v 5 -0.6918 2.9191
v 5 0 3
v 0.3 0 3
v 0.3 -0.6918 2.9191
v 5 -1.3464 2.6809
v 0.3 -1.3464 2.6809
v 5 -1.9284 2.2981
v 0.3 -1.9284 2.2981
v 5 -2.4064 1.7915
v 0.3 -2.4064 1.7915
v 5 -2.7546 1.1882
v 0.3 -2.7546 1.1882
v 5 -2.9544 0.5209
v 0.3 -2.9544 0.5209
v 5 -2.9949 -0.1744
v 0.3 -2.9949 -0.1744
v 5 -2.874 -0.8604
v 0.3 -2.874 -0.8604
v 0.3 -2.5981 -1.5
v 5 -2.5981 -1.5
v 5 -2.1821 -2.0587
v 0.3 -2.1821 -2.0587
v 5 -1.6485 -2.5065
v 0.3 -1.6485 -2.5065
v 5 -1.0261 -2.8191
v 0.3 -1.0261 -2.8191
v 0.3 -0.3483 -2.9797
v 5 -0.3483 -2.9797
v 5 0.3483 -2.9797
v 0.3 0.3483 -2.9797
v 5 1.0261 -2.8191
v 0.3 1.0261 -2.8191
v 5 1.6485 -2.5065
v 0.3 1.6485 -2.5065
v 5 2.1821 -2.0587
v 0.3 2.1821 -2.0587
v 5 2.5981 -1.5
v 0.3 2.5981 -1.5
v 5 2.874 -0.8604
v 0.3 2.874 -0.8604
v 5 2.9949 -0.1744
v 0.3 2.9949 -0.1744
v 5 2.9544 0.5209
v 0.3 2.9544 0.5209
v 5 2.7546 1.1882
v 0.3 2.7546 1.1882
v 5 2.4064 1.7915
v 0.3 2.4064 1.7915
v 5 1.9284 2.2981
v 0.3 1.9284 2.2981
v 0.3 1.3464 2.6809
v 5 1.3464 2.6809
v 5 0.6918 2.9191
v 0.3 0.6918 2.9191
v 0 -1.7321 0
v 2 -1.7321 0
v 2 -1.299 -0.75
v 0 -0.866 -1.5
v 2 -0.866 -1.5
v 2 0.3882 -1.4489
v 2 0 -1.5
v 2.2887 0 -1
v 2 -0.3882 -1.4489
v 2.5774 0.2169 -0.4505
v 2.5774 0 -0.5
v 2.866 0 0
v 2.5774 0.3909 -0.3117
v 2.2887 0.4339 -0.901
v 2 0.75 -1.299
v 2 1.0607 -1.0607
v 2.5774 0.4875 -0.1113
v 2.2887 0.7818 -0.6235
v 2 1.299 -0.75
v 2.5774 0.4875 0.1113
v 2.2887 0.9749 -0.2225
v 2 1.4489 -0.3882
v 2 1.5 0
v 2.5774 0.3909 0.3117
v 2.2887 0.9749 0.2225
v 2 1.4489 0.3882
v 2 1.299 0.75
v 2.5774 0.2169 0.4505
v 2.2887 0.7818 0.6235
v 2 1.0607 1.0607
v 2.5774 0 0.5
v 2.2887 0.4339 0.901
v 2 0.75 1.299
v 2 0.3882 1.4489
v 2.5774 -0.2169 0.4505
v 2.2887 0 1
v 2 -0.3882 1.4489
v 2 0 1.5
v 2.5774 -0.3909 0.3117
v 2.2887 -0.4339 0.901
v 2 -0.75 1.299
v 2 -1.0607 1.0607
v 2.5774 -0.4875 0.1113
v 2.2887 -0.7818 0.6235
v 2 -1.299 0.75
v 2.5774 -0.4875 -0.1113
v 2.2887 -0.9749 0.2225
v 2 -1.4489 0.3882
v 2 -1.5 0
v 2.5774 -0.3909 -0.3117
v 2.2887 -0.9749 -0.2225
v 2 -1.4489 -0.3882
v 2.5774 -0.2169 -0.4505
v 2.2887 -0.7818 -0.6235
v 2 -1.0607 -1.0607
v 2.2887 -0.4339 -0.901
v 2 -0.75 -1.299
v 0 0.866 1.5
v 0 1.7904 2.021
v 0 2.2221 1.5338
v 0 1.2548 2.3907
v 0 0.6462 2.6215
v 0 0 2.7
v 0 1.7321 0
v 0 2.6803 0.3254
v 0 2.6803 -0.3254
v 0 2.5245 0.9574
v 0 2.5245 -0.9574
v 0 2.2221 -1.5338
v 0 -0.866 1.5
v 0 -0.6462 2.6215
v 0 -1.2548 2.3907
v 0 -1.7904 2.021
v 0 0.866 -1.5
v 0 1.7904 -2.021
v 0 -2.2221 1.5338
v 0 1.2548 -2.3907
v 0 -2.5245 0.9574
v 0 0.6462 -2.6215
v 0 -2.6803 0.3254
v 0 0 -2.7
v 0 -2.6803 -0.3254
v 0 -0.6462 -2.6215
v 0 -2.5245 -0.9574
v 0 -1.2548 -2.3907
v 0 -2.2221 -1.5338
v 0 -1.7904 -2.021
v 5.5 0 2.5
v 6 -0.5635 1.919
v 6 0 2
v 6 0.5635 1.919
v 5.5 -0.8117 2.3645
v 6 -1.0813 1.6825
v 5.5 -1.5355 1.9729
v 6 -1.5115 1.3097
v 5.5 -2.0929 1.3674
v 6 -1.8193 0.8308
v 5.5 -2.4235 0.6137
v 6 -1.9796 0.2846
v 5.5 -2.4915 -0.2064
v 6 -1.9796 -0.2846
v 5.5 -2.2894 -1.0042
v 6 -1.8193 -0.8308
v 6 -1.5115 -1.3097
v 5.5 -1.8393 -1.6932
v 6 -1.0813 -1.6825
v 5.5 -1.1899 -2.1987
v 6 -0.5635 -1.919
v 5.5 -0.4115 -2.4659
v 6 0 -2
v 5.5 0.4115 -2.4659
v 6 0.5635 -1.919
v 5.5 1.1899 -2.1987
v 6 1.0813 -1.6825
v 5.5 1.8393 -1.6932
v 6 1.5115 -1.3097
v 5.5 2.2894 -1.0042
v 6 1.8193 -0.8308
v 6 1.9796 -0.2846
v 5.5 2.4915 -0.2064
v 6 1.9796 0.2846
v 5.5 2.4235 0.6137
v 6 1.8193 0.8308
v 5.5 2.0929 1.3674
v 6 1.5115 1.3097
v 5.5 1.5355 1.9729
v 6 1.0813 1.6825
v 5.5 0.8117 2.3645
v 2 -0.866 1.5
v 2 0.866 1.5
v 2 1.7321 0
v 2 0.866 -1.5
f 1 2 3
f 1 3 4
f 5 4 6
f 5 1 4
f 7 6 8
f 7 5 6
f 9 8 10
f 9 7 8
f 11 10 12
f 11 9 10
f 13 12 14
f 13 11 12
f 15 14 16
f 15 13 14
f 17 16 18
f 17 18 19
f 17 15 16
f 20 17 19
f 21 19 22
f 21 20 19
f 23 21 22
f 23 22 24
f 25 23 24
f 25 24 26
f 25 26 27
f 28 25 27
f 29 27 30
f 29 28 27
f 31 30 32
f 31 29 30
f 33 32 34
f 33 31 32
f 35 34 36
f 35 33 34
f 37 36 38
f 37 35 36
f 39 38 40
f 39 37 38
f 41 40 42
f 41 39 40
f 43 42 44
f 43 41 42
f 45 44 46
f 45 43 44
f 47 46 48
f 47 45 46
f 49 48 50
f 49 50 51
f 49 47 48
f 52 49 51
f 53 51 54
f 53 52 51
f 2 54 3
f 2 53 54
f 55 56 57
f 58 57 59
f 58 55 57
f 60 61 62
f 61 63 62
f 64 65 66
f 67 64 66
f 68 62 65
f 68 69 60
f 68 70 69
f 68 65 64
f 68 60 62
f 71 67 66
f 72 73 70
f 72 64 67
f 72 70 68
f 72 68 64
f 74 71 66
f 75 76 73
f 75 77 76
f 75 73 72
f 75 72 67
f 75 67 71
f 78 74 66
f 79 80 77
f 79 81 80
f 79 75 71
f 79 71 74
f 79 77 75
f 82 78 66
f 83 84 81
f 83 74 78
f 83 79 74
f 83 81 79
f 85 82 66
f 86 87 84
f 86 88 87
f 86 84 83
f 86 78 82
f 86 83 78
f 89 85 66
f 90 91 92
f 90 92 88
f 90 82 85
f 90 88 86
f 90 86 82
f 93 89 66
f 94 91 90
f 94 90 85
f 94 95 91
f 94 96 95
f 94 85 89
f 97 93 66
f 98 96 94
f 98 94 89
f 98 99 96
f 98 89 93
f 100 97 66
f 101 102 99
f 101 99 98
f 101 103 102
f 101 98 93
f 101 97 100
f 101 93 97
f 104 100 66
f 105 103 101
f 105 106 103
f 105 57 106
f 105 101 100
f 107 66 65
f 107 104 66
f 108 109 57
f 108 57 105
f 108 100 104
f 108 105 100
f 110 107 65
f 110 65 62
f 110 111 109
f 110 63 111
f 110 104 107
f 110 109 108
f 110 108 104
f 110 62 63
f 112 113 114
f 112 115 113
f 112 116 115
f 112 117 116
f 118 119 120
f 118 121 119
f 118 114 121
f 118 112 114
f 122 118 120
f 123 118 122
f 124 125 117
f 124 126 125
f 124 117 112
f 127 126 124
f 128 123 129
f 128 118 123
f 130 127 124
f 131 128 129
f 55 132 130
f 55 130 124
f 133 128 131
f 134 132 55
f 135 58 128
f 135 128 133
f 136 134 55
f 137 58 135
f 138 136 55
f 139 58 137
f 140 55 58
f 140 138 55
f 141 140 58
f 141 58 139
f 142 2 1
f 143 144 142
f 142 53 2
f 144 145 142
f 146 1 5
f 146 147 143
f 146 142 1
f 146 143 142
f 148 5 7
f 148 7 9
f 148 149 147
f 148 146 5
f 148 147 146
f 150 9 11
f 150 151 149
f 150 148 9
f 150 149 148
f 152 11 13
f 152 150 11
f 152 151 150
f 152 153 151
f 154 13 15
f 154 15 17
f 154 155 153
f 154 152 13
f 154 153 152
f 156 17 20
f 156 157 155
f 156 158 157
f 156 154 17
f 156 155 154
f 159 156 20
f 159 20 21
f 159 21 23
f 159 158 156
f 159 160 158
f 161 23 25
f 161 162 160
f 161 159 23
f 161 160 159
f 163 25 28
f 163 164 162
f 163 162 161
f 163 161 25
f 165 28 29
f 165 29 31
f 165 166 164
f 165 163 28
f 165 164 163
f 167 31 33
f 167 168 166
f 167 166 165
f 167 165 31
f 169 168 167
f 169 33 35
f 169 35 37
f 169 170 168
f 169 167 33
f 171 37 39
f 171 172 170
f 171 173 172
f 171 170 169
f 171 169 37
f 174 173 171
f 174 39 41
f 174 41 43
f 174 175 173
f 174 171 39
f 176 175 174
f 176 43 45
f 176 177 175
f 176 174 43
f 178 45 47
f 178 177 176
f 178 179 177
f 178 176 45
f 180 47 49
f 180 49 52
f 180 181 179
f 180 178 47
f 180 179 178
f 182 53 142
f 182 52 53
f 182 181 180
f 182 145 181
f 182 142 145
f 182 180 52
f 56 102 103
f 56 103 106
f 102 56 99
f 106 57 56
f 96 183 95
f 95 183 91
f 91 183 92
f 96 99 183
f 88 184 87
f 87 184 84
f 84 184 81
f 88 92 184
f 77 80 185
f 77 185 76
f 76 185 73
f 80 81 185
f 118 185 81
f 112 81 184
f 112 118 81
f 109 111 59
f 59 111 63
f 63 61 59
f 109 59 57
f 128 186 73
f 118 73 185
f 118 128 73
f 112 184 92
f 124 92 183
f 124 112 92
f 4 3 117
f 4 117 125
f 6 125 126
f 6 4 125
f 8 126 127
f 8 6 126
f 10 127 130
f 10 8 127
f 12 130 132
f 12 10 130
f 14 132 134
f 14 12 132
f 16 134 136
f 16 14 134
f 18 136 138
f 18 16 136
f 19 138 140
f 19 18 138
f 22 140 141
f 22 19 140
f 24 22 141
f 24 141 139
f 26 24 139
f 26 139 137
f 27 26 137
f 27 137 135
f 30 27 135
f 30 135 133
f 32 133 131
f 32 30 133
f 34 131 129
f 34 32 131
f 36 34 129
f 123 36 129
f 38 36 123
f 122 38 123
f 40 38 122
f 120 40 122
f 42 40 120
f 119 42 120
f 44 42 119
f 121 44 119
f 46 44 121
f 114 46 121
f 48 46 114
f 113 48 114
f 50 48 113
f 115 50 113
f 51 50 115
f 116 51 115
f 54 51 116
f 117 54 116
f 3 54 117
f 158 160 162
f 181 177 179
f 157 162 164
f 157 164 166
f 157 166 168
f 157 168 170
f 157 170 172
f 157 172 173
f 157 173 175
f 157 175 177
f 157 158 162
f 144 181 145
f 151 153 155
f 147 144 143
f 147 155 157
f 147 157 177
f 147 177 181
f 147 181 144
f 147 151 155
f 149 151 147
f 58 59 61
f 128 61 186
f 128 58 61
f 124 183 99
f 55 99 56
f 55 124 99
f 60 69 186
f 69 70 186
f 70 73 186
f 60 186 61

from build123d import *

# Parameters (mm, degrees)
CHAMFER1_SIZE      = 0.3
CUT_EXTRUDE1_DEPTH = 2


with BuildPart() as part:
    # Sketch1 → Revolve1 (revolve)
    with BuildSketch(Plane.XY, mode=Mode.PRIVATE) as revolve1_sk:
        Polygon((5, 3), (6, 2), (6, 0), (0, 0), (0, 3), align=None)
    revolve(revolve1_sk.sketch.rotate(Axis((0, 0, 0), (1, 0, 0)), 90), axis=Axis((0, 0, 0), (1, 0, 0)))

    # Chamfer1
    chamfer1_edges = [part.edges().sort_by_distance(p)[0] for p in [
        (0, 0, -3),
    ]]
    chamfer(chamfer1_edges, length=CHAMFER1_SIZE)

    # Sketch2 → Cut-Extrude1 (cut)
    with BuildSketch(Plane(origin=(0, 0, 0), x_dir=(0, 0, -1), z_dir=(1, 0, 0))):
        Polygon((0, 1.732050808), (-1.5, 0.866025404), (-1.5, -0.866025404), (0, -1.732050808), (1.5, -0.866025404), (1.5, 0.866025404), align=None)
    extrude(amount=CUT_EXTRUDE1_DEPTH, mode=Mode.SUBTRACT)

    # Sketch3 → Cut-Revolve1 (revolve, cut)
    with BuildSketch(Plane.XY, mode=Mode.PRIVATE) as cut_revolve1_sk:
        Polygon((2.866025404, 0), (2, 1.5), (2, 0), align=None)
    revolve(cut_revolve1_sk.sketch.rotate(Axis((2, 0, 0), (1, 0, 0)), 270), axis=Axis((2, 0, 0), (1, 0, 0)), mode=Mode.SUBTRACT)


solid = part.part
